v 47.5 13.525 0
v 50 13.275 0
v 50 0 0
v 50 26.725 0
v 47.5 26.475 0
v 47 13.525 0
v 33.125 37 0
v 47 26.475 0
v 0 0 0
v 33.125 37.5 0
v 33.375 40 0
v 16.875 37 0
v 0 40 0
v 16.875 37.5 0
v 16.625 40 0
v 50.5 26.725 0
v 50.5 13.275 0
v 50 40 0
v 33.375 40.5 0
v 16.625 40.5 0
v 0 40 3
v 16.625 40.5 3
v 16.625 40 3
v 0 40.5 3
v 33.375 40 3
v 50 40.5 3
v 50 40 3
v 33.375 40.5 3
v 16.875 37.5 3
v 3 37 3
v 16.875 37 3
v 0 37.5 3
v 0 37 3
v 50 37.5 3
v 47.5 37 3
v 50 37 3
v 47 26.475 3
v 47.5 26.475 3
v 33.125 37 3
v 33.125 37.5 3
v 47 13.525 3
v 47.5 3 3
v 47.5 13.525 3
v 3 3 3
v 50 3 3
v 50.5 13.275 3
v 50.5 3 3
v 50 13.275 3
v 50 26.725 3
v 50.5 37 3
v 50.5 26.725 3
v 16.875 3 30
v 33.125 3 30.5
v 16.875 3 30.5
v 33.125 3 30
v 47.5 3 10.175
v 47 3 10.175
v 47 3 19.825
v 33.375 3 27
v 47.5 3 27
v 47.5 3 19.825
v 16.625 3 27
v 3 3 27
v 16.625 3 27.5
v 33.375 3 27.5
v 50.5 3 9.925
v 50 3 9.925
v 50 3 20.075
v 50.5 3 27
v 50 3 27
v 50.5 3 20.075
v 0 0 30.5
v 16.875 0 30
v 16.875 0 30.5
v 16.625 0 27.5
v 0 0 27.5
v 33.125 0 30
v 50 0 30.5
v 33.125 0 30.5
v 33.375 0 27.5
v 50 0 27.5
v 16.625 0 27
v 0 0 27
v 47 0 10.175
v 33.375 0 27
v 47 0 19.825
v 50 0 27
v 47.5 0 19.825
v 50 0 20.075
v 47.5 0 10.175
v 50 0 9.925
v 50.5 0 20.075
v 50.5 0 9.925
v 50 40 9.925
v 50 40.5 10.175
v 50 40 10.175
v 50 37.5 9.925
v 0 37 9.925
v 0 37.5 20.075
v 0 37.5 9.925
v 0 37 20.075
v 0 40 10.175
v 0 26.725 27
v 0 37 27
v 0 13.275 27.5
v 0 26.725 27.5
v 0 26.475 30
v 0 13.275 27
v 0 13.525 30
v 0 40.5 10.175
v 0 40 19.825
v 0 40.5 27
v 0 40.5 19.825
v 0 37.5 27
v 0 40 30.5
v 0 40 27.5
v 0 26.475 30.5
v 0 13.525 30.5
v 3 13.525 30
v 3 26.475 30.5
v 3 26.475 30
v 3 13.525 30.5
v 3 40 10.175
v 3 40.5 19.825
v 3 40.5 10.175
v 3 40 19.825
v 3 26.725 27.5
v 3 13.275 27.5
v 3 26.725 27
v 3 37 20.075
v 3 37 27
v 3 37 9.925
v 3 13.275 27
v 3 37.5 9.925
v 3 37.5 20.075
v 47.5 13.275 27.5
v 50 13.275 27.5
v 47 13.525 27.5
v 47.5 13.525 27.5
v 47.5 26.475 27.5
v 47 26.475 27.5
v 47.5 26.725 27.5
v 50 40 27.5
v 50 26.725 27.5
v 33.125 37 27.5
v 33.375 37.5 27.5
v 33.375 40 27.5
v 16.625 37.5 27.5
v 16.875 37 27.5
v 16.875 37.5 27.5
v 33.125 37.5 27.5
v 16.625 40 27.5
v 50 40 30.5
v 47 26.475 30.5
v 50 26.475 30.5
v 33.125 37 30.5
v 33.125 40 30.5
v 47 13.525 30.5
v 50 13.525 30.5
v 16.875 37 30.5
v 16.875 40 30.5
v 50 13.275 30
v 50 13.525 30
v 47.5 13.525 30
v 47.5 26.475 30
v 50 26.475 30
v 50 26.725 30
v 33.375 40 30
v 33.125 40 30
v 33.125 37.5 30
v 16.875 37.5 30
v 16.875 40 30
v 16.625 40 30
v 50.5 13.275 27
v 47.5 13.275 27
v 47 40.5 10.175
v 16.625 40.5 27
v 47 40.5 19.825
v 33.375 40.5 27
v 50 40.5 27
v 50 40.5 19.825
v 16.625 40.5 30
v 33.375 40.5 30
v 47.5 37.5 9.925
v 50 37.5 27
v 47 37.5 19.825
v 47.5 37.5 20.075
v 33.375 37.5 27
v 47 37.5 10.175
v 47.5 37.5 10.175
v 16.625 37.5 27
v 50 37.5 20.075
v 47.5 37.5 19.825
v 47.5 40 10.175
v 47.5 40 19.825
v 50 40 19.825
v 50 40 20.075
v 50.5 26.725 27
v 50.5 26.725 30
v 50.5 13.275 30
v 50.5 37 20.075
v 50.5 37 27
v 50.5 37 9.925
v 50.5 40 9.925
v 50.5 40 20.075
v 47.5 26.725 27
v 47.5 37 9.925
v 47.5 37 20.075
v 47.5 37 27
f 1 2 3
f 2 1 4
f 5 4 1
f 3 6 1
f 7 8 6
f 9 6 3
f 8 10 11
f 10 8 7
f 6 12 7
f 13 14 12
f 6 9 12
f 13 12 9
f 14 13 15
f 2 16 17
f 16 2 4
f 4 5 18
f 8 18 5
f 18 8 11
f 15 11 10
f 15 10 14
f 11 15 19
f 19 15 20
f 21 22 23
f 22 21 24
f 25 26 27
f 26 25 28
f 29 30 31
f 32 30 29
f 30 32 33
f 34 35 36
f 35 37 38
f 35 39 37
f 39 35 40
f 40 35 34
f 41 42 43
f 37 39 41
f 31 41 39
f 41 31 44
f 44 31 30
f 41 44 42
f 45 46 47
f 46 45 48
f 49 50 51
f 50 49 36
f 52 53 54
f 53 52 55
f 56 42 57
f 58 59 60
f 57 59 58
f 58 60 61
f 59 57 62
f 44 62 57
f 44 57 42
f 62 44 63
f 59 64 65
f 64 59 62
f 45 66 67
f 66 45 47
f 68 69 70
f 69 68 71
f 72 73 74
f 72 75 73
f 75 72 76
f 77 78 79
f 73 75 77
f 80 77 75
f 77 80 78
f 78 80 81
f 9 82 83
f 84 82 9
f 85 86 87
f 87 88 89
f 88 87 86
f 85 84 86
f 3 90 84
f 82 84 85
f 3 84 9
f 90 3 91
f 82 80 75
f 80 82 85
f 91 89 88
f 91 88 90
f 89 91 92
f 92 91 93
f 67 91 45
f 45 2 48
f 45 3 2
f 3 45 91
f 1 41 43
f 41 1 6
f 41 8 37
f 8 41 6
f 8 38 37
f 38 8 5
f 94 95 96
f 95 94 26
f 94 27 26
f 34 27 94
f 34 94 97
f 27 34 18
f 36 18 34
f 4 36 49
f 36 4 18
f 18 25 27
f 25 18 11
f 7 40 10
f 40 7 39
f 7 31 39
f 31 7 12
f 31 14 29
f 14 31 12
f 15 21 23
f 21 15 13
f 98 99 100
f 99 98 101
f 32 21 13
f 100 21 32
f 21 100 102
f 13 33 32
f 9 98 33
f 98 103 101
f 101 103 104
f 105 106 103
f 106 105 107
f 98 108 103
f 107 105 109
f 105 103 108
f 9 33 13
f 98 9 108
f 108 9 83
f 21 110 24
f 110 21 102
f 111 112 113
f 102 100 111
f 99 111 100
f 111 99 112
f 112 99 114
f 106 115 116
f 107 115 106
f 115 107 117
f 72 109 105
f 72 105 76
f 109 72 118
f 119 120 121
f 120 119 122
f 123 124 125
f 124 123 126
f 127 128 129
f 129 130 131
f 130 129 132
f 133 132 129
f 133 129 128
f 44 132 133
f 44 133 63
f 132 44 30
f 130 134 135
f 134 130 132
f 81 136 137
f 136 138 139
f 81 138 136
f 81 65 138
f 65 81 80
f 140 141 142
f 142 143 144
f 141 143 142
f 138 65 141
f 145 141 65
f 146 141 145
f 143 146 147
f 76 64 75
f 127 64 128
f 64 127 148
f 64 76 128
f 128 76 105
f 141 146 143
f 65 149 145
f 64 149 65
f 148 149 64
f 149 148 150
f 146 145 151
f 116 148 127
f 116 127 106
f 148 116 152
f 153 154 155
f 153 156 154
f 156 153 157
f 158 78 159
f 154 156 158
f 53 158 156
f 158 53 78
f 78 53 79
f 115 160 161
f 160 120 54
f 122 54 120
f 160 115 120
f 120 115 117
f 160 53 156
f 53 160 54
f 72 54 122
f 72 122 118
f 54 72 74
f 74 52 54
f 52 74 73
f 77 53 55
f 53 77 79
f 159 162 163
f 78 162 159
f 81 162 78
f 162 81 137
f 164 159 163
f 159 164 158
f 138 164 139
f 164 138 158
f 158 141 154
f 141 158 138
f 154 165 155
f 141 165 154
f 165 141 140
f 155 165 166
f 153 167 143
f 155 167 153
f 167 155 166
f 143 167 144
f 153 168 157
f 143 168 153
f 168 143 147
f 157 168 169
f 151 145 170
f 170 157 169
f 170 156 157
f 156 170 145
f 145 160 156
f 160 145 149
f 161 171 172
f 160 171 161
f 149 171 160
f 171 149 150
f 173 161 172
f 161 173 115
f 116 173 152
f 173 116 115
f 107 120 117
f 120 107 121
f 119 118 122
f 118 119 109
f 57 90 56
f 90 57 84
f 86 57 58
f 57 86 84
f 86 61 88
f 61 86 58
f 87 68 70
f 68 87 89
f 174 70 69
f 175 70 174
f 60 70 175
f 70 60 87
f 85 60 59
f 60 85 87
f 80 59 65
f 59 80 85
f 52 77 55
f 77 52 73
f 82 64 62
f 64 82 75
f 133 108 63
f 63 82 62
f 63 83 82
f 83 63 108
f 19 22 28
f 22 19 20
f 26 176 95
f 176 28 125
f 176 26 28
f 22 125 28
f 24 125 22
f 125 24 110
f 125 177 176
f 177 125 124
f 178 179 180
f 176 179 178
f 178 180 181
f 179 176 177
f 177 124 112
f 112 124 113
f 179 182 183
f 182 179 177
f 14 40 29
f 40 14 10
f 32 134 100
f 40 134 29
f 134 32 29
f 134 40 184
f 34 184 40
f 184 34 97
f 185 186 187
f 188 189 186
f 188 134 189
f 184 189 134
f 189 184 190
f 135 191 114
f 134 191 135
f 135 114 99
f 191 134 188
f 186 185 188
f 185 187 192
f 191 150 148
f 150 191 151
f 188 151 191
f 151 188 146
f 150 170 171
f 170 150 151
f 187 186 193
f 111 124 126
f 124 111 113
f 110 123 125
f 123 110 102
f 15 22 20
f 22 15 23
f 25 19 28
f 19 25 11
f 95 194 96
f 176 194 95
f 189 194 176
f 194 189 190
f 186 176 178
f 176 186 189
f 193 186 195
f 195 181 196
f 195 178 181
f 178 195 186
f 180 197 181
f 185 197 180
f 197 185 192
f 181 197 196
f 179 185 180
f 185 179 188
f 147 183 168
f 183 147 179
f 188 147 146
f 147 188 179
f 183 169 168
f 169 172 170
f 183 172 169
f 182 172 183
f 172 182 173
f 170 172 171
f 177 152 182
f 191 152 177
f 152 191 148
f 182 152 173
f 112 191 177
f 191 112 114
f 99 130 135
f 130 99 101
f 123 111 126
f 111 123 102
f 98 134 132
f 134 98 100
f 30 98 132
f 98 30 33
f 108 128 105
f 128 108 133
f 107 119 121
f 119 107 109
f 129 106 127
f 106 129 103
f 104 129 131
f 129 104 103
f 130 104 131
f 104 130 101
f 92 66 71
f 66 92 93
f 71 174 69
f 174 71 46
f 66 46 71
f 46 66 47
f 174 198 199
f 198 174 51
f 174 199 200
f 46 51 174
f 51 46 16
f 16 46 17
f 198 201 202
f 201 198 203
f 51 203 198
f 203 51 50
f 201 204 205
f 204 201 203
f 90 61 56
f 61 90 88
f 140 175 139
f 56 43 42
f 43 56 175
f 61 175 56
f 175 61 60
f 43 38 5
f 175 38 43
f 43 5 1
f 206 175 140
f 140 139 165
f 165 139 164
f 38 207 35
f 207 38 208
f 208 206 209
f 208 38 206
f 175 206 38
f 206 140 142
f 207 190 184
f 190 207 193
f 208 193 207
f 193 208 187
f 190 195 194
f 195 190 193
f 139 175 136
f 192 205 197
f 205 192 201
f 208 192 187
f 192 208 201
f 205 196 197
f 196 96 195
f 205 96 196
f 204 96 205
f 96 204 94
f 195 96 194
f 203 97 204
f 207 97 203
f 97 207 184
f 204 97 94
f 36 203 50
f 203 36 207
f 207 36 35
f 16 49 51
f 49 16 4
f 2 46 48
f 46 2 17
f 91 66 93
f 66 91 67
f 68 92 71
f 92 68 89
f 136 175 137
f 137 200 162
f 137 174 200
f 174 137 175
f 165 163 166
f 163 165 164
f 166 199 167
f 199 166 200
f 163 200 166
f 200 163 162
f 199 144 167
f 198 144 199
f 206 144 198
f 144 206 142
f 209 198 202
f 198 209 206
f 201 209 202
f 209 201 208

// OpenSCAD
/*
A very simple box-generator for laser cutting.

Version 1.2
Tjark Nieber 2017
www.thingiverse.com/SharkNado

*/

//Preview/Render
rendering = "false"; //[false,true]

//Rendering for STL export
for_3D_print = "true"; //[false,true]

//Box/Shelf
modus = "box"; //[box,shelf]

// Width in mm
width = 50;

// Length
length= 40;

// Height
height =30;

//Material Thickness in mm
th = 3;

// Joinsize Scaling
js = 0.33; 

//Correction in mm
cor = 0.25;

//Margin
margin = 2;

if(rendering == "true")renderView();
if(rendering  == "false")preview();

    
//#################################################
/*
Example for cutting into top/bottom cover:
difference(){
    ground(true);
    translate([width/2,length/2,0])resize([width-4*th,0,0],[true,true,false])text("some text",valign="center",halign="center");
}*/
//#################################################

module preview(){
    s=0.5;   
                                                3D() ground();
    if(modus=="box")translate([0,0,height-th+s])3D() ground();
    translate([0,th,0])rotate([90,0,0])         3D() front();
    translate([0,length+s,0])rotate([90,0,0])   3D() front();
    translate([th,0,0])rotate([0,-90,0])        3D() side();
    translate([width+s,0,0])rotate([0,-90,0])   3D() side();
}

module renderView(){
    if(for_3D_print == "true"){
        3D()renderSet();
    }else{
        renderSet();
    }
    module renderSet(){
                                             ground();
        translate([-height-margin,0,0])      side();
        translate([width+margin,0,0])        side();
        translate([0,-height-margin,0])      front();
        translate([0,length+margin,0])       front();
        if(modus=="box")translate([0,length+height+2*margin])ground();
    }
}

//#################################################
module 3D(){
    c=rands(0,100,3);
    color([c[0]/100,c[1]/100,c[2]/100])linear_extrude(height=th)children();
}
//button and top
module ground(){
     plate(width,length,th,cor,[-1,-1,-1,-1]);
}

//sides left and right
module side(){
    plate(height,length,th,cor,[1,1,1,1]);
    if(modus=="shelf"){
        translate([height-th,th,0])square([th,length-2*th]);
    }
}
//front and back
module front(){
    plate(width,height,th,cor,[1,1,-1,-1]);
     if(modus=="shelf"){
        translate([0,height-th,0])square([width,th]);
    }
}

//#################################################

//raw plate
module plate(w,l,th,cor,conf){
    F=conf[0];  // Front
    B=conf[1];  // Back
    L=conf[2];  // Left
    R=conf[3];  // Right
    
    // Pseudo-Random coloring
    green = (128 + 64*F+32*B)/255;
    blue = (128 + 64*L+32*R)/255;
    
    
    
    _plate();
    
    
    module _plate(){
        difference(){
            square([w,l]);
            if(F==1){square([w,th]);}
            if(F==-1){j(w,0);}
            if(B==1){translate([0,l-th])square([w,th]);}
            if(B==-1){translate([0,l-th])j(w,0);}
            if(L==1){square([th,l]);}
            if(L==-1){translate([th,0,0])j(l,90);}
            if(R==1){translate([w-th,0,0])square([th,l]);}
            if(R==-1){translate([w,0,0])j(l,90);}
        }
           
            if(F==1){j(w,0,false);}           
            if(B==1){translate([0,l-th])j(w,0,false);}           
            if(L==1){translate([th,0,0])j(l,90,false);}            
            if(R==1){translate([w,0,0])j(l,90,false);}
    }
    
    
    
    module j(dist,rot,cut=true){
        rotate([0,0,rot]){
            if(!cut)translate([(dist-dist*js)/2-cor/2,0,0])square([dist*js+cor,th]);
            if(cut)translate([(dist-dist*js)/2+cor/2,0,0])square([dist*js-cor,th]);
        }
    }
    
    
}
